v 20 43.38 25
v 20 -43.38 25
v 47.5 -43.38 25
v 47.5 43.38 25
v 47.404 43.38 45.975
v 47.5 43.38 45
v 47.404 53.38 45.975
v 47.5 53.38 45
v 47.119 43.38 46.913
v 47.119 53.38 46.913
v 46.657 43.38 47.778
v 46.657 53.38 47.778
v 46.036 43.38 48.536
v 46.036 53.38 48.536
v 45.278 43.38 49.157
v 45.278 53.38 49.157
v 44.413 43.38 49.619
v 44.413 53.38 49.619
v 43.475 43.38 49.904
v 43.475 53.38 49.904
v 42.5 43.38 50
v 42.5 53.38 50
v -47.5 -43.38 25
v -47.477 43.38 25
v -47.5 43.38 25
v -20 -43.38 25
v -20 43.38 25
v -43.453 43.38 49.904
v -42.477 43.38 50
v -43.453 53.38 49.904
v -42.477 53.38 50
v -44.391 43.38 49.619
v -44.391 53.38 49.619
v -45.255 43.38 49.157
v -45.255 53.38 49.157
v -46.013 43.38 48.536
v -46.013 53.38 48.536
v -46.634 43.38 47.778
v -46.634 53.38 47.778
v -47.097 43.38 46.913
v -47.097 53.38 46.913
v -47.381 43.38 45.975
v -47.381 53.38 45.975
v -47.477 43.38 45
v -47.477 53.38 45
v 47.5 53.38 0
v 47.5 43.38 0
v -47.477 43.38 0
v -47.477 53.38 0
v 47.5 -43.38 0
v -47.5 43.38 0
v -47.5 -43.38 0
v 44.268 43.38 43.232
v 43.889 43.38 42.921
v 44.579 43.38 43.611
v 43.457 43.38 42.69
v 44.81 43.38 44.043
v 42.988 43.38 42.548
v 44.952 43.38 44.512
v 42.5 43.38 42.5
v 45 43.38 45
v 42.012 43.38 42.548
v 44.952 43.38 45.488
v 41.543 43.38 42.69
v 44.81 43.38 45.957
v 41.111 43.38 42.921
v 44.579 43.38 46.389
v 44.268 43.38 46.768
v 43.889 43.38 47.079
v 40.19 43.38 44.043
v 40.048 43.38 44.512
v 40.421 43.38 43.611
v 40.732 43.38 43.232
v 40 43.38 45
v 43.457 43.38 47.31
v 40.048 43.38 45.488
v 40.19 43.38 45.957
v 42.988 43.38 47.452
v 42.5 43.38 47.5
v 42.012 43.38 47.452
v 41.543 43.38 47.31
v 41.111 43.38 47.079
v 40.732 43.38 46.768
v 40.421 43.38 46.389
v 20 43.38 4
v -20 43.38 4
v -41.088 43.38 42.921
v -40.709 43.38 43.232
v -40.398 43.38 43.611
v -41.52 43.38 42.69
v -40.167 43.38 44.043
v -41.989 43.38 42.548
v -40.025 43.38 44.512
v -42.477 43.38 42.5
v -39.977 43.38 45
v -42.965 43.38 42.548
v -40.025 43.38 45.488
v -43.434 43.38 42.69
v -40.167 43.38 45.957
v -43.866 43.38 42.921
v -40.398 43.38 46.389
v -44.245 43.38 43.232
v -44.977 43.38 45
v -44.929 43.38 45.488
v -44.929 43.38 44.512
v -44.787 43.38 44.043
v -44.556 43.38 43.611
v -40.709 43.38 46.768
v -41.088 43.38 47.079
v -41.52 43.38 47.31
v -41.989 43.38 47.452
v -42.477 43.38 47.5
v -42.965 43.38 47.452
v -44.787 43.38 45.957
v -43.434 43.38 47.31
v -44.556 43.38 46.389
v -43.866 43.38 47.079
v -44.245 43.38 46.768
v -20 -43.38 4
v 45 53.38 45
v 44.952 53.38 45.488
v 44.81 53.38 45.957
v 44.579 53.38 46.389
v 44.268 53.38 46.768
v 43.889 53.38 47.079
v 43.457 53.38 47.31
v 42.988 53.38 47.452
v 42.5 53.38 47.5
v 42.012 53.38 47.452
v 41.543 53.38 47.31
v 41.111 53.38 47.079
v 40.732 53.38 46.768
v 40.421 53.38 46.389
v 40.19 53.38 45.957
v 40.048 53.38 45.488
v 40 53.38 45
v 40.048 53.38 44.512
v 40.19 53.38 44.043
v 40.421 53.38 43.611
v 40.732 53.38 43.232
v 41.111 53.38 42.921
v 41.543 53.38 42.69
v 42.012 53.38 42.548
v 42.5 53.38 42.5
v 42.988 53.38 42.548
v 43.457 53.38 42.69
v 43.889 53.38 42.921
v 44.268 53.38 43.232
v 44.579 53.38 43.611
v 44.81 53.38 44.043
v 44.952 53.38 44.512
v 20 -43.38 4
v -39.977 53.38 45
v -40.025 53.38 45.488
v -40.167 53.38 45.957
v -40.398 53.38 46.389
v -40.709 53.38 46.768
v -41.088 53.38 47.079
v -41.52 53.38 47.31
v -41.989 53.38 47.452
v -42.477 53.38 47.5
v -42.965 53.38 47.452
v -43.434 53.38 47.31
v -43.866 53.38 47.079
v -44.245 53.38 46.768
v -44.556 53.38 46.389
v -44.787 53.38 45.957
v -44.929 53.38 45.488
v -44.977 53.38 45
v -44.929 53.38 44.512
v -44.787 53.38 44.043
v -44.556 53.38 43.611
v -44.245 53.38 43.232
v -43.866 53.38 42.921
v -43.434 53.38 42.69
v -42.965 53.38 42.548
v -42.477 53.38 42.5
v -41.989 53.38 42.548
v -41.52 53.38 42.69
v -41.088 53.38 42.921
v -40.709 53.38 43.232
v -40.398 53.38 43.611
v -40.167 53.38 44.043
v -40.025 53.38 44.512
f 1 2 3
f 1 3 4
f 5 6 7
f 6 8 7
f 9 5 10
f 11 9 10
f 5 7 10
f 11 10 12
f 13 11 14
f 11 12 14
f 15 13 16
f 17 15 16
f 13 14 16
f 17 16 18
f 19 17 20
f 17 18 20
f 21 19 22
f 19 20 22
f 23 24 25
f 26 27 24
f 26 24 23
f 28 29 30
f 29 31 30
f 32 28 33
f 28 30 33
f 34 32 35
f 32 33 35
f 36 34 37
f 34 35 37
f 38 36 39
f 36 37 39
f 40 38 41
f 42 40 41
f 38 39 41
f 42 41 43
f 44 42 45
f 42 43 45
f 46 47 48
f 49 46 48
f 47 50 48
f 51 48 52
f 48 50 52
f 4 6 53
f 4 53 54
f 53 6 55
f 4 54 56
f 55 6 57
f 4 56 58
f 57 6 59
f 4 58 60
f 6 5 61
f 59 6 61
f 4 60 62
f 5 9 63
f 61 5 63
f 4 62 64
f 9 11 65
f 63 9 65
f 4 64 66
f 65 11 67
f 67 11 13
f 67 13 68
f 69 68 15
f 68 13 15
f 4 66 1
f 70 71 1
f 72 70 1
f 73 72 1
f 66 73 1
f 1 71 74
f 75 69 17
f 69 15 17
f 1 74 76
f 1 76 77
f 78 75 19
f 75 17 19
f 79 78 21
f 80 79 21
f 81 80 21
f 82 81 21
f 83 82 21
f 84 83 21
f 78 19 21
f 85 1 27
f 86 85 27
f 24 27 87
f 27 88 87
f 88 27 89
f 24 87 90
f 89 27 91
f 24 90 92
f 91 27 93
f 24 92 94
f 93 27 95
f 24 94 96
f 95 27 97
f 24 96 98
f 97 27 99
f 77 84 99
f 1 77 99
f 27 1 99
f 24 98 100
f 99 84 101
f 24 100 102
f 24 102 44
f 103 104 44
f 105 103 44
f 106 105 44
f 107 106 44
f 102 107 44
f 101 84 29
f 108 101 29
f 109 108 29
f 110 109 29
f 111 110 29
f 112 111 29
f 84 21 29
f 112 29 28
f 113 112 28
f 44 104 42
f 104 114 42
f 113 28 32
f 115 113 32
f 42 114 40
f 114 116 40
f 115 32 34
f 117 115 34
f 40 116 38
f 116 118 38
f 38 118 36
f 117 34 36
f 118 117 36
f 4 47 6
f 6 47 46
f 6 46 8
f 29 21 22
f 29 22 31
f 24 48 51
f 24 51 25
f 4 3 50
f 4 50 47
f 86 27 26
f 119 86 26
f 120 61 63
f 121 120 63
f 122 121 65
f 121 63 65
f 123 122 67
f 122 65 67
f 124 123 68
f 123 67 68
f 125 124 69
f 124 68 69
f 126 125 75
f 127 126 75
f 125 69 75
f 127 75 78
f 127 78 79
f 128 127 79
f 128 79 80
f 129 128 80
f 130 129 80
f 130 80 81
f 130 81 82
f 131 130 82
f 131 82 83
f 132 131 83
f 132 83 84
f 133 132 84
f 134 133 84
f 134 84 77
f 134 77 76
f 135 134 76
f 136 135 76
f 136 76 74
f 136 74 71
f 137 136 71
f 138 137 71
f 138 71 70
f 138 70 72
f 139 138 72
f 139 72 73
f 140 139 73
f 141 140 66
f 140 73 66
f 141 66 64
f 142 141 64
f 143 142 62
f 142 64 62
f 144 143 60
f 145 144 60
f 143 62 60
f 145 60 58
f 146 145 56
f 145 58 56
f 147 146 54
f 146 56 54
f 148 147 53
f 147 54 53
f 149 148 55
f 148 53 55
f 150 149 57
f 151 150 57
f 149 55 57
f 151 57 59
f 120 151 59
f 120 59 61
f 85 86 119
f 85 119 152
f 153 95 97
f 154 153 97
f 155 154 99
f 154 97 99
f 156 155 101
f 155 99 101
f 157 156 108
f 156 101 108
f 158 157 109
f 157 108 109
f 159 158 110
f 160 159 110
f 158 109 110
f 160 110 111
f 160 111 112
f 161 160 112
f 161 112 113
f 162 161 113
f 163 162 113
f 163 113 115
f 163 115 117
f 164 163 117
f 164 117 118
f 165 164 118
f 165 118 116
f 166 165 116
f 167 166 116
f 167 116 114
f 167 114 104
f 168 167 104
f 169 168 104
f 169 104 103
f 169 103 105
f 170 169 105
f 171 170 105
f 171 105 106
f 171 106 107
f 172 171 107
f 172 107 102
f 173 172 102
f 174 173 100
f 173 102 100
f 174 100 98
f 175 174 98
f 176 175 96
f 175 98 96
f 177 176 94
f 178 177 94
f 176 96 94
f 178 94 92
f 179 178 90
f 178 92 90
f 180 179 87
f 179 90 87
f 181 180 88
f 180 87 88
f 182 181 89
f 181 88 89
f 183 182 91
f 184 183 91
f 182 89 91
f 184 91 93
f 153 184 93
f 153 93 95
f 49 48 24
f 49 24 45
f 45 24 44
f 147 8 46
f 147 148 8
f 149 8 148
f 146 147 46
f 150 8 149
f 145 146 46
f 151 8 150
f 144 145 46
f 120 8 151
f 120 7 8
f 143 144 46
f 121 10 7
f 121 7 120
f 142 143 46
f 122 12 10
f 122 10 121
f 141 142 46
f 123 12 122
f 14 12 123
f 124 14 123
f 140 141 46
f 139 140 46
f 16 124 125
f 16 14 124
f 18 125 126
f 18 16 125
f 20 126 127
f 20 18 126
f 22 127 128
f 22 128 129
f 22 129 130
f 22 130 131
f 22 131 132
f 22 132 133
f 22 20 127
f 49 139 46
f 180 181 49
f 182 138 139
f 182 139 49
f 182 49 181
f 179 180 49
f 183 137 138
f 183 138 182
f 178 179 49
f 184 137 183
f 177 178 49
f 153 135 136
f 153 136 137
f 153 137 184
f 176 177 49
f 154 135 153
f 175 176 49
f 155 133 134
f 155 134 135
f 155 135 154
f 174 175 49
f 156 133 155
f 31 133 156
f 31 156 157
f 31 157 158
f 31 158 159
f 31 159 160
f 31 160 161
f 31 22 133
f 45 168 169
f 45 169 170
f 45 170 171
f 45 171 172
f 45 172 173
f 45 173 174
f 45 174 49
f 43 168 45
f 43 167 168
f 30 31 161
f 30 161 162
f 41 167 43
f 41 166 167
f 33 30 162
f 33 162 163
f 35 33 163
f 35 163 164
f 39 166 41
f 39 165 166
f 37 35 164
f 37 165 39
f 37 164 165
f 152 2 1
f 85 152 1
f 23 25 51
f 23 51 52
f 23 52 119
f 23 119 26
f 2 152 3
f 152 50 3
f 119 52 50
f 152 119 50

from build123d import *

# Parameters (mm, degrees)
F0_W      = 40
F0_H      = 86.76
F1_DEPTH  = 4
F2_W      = 95
F2_H      = 25
F3_DEPTH  = 27.5
F4_W      = 86.76
F4_H      = 25
F5_DEPTH  = 27.5
F6_W      = 94.977141
F6_H      = 50
F7_DEPTH  = 10
F8_R      = 5
F9_R      = 5
F10_R     = 2.5
F11_DEPTH = 10.001


with BuildPart() as f1:
    # F0 (on Top) → F1 (new body)
    with BuildSketch(Plane.XY):
        Rectangle(F0_W, F0_H)
    extrude(amount=F1_DEPTH)

    # F2 (on face) → F3 (join)
    with BuildSketch(Plane.YZ.offset(20)):
        with Locations((4.12, 12.5)):
            Rectangle(F2_W, F2_H)
    extrude(amount=F3_DEPTH)

    # F4 (on face) → F5 (join)
    with BuildSketch(Plane(origin=(-20, 0, 0), x_dir=(0, -1, 0), z_dir=(-1, 0, 0))):
        with Locations((0, 12.5)):
            Rectangle(F4_W, F4_H)
    extrude(amount=F5_DEPTH)

    # F6 (on face) → F7 (join)
    with BuildSketch(Plane(origin=(0, 43.38, 0), x_dir=(-1, 0, 0), z_dir=(0, 1, 0))):
        with Locations((-0.01143, 25)):
            Rectangle(F6_W, F6_H)
    extrude(amount=F7_DEPTH)

    # F8
    f8_edges = [f1.edges().sort_by_distance(p)[0] for p in [
        (47.5, 48.38, 50),
    ]]
    fillet(f8_edges, radius=F8_R)

    # F9
    f9_edges = [f1.edges().sort_by_distance(p)[0] for p in [
        (-47.477141, 48.38, 50),
    ]]
    fillet(f9_edges, radius=F9_R)

    # F10 (on face) → F11 (cut, through all)
    with BuildSketch(Plane.XZ.offset(-43.38)):
        with Locations((-42.477141, 45)):
            Circle(F10_R)
        with Locations((42.5, 45)):
            Circle(F10_R)
    extrude(amount=-F11_DEPTH, mode=Mode.SUBTRACT)


solid = f1.part
